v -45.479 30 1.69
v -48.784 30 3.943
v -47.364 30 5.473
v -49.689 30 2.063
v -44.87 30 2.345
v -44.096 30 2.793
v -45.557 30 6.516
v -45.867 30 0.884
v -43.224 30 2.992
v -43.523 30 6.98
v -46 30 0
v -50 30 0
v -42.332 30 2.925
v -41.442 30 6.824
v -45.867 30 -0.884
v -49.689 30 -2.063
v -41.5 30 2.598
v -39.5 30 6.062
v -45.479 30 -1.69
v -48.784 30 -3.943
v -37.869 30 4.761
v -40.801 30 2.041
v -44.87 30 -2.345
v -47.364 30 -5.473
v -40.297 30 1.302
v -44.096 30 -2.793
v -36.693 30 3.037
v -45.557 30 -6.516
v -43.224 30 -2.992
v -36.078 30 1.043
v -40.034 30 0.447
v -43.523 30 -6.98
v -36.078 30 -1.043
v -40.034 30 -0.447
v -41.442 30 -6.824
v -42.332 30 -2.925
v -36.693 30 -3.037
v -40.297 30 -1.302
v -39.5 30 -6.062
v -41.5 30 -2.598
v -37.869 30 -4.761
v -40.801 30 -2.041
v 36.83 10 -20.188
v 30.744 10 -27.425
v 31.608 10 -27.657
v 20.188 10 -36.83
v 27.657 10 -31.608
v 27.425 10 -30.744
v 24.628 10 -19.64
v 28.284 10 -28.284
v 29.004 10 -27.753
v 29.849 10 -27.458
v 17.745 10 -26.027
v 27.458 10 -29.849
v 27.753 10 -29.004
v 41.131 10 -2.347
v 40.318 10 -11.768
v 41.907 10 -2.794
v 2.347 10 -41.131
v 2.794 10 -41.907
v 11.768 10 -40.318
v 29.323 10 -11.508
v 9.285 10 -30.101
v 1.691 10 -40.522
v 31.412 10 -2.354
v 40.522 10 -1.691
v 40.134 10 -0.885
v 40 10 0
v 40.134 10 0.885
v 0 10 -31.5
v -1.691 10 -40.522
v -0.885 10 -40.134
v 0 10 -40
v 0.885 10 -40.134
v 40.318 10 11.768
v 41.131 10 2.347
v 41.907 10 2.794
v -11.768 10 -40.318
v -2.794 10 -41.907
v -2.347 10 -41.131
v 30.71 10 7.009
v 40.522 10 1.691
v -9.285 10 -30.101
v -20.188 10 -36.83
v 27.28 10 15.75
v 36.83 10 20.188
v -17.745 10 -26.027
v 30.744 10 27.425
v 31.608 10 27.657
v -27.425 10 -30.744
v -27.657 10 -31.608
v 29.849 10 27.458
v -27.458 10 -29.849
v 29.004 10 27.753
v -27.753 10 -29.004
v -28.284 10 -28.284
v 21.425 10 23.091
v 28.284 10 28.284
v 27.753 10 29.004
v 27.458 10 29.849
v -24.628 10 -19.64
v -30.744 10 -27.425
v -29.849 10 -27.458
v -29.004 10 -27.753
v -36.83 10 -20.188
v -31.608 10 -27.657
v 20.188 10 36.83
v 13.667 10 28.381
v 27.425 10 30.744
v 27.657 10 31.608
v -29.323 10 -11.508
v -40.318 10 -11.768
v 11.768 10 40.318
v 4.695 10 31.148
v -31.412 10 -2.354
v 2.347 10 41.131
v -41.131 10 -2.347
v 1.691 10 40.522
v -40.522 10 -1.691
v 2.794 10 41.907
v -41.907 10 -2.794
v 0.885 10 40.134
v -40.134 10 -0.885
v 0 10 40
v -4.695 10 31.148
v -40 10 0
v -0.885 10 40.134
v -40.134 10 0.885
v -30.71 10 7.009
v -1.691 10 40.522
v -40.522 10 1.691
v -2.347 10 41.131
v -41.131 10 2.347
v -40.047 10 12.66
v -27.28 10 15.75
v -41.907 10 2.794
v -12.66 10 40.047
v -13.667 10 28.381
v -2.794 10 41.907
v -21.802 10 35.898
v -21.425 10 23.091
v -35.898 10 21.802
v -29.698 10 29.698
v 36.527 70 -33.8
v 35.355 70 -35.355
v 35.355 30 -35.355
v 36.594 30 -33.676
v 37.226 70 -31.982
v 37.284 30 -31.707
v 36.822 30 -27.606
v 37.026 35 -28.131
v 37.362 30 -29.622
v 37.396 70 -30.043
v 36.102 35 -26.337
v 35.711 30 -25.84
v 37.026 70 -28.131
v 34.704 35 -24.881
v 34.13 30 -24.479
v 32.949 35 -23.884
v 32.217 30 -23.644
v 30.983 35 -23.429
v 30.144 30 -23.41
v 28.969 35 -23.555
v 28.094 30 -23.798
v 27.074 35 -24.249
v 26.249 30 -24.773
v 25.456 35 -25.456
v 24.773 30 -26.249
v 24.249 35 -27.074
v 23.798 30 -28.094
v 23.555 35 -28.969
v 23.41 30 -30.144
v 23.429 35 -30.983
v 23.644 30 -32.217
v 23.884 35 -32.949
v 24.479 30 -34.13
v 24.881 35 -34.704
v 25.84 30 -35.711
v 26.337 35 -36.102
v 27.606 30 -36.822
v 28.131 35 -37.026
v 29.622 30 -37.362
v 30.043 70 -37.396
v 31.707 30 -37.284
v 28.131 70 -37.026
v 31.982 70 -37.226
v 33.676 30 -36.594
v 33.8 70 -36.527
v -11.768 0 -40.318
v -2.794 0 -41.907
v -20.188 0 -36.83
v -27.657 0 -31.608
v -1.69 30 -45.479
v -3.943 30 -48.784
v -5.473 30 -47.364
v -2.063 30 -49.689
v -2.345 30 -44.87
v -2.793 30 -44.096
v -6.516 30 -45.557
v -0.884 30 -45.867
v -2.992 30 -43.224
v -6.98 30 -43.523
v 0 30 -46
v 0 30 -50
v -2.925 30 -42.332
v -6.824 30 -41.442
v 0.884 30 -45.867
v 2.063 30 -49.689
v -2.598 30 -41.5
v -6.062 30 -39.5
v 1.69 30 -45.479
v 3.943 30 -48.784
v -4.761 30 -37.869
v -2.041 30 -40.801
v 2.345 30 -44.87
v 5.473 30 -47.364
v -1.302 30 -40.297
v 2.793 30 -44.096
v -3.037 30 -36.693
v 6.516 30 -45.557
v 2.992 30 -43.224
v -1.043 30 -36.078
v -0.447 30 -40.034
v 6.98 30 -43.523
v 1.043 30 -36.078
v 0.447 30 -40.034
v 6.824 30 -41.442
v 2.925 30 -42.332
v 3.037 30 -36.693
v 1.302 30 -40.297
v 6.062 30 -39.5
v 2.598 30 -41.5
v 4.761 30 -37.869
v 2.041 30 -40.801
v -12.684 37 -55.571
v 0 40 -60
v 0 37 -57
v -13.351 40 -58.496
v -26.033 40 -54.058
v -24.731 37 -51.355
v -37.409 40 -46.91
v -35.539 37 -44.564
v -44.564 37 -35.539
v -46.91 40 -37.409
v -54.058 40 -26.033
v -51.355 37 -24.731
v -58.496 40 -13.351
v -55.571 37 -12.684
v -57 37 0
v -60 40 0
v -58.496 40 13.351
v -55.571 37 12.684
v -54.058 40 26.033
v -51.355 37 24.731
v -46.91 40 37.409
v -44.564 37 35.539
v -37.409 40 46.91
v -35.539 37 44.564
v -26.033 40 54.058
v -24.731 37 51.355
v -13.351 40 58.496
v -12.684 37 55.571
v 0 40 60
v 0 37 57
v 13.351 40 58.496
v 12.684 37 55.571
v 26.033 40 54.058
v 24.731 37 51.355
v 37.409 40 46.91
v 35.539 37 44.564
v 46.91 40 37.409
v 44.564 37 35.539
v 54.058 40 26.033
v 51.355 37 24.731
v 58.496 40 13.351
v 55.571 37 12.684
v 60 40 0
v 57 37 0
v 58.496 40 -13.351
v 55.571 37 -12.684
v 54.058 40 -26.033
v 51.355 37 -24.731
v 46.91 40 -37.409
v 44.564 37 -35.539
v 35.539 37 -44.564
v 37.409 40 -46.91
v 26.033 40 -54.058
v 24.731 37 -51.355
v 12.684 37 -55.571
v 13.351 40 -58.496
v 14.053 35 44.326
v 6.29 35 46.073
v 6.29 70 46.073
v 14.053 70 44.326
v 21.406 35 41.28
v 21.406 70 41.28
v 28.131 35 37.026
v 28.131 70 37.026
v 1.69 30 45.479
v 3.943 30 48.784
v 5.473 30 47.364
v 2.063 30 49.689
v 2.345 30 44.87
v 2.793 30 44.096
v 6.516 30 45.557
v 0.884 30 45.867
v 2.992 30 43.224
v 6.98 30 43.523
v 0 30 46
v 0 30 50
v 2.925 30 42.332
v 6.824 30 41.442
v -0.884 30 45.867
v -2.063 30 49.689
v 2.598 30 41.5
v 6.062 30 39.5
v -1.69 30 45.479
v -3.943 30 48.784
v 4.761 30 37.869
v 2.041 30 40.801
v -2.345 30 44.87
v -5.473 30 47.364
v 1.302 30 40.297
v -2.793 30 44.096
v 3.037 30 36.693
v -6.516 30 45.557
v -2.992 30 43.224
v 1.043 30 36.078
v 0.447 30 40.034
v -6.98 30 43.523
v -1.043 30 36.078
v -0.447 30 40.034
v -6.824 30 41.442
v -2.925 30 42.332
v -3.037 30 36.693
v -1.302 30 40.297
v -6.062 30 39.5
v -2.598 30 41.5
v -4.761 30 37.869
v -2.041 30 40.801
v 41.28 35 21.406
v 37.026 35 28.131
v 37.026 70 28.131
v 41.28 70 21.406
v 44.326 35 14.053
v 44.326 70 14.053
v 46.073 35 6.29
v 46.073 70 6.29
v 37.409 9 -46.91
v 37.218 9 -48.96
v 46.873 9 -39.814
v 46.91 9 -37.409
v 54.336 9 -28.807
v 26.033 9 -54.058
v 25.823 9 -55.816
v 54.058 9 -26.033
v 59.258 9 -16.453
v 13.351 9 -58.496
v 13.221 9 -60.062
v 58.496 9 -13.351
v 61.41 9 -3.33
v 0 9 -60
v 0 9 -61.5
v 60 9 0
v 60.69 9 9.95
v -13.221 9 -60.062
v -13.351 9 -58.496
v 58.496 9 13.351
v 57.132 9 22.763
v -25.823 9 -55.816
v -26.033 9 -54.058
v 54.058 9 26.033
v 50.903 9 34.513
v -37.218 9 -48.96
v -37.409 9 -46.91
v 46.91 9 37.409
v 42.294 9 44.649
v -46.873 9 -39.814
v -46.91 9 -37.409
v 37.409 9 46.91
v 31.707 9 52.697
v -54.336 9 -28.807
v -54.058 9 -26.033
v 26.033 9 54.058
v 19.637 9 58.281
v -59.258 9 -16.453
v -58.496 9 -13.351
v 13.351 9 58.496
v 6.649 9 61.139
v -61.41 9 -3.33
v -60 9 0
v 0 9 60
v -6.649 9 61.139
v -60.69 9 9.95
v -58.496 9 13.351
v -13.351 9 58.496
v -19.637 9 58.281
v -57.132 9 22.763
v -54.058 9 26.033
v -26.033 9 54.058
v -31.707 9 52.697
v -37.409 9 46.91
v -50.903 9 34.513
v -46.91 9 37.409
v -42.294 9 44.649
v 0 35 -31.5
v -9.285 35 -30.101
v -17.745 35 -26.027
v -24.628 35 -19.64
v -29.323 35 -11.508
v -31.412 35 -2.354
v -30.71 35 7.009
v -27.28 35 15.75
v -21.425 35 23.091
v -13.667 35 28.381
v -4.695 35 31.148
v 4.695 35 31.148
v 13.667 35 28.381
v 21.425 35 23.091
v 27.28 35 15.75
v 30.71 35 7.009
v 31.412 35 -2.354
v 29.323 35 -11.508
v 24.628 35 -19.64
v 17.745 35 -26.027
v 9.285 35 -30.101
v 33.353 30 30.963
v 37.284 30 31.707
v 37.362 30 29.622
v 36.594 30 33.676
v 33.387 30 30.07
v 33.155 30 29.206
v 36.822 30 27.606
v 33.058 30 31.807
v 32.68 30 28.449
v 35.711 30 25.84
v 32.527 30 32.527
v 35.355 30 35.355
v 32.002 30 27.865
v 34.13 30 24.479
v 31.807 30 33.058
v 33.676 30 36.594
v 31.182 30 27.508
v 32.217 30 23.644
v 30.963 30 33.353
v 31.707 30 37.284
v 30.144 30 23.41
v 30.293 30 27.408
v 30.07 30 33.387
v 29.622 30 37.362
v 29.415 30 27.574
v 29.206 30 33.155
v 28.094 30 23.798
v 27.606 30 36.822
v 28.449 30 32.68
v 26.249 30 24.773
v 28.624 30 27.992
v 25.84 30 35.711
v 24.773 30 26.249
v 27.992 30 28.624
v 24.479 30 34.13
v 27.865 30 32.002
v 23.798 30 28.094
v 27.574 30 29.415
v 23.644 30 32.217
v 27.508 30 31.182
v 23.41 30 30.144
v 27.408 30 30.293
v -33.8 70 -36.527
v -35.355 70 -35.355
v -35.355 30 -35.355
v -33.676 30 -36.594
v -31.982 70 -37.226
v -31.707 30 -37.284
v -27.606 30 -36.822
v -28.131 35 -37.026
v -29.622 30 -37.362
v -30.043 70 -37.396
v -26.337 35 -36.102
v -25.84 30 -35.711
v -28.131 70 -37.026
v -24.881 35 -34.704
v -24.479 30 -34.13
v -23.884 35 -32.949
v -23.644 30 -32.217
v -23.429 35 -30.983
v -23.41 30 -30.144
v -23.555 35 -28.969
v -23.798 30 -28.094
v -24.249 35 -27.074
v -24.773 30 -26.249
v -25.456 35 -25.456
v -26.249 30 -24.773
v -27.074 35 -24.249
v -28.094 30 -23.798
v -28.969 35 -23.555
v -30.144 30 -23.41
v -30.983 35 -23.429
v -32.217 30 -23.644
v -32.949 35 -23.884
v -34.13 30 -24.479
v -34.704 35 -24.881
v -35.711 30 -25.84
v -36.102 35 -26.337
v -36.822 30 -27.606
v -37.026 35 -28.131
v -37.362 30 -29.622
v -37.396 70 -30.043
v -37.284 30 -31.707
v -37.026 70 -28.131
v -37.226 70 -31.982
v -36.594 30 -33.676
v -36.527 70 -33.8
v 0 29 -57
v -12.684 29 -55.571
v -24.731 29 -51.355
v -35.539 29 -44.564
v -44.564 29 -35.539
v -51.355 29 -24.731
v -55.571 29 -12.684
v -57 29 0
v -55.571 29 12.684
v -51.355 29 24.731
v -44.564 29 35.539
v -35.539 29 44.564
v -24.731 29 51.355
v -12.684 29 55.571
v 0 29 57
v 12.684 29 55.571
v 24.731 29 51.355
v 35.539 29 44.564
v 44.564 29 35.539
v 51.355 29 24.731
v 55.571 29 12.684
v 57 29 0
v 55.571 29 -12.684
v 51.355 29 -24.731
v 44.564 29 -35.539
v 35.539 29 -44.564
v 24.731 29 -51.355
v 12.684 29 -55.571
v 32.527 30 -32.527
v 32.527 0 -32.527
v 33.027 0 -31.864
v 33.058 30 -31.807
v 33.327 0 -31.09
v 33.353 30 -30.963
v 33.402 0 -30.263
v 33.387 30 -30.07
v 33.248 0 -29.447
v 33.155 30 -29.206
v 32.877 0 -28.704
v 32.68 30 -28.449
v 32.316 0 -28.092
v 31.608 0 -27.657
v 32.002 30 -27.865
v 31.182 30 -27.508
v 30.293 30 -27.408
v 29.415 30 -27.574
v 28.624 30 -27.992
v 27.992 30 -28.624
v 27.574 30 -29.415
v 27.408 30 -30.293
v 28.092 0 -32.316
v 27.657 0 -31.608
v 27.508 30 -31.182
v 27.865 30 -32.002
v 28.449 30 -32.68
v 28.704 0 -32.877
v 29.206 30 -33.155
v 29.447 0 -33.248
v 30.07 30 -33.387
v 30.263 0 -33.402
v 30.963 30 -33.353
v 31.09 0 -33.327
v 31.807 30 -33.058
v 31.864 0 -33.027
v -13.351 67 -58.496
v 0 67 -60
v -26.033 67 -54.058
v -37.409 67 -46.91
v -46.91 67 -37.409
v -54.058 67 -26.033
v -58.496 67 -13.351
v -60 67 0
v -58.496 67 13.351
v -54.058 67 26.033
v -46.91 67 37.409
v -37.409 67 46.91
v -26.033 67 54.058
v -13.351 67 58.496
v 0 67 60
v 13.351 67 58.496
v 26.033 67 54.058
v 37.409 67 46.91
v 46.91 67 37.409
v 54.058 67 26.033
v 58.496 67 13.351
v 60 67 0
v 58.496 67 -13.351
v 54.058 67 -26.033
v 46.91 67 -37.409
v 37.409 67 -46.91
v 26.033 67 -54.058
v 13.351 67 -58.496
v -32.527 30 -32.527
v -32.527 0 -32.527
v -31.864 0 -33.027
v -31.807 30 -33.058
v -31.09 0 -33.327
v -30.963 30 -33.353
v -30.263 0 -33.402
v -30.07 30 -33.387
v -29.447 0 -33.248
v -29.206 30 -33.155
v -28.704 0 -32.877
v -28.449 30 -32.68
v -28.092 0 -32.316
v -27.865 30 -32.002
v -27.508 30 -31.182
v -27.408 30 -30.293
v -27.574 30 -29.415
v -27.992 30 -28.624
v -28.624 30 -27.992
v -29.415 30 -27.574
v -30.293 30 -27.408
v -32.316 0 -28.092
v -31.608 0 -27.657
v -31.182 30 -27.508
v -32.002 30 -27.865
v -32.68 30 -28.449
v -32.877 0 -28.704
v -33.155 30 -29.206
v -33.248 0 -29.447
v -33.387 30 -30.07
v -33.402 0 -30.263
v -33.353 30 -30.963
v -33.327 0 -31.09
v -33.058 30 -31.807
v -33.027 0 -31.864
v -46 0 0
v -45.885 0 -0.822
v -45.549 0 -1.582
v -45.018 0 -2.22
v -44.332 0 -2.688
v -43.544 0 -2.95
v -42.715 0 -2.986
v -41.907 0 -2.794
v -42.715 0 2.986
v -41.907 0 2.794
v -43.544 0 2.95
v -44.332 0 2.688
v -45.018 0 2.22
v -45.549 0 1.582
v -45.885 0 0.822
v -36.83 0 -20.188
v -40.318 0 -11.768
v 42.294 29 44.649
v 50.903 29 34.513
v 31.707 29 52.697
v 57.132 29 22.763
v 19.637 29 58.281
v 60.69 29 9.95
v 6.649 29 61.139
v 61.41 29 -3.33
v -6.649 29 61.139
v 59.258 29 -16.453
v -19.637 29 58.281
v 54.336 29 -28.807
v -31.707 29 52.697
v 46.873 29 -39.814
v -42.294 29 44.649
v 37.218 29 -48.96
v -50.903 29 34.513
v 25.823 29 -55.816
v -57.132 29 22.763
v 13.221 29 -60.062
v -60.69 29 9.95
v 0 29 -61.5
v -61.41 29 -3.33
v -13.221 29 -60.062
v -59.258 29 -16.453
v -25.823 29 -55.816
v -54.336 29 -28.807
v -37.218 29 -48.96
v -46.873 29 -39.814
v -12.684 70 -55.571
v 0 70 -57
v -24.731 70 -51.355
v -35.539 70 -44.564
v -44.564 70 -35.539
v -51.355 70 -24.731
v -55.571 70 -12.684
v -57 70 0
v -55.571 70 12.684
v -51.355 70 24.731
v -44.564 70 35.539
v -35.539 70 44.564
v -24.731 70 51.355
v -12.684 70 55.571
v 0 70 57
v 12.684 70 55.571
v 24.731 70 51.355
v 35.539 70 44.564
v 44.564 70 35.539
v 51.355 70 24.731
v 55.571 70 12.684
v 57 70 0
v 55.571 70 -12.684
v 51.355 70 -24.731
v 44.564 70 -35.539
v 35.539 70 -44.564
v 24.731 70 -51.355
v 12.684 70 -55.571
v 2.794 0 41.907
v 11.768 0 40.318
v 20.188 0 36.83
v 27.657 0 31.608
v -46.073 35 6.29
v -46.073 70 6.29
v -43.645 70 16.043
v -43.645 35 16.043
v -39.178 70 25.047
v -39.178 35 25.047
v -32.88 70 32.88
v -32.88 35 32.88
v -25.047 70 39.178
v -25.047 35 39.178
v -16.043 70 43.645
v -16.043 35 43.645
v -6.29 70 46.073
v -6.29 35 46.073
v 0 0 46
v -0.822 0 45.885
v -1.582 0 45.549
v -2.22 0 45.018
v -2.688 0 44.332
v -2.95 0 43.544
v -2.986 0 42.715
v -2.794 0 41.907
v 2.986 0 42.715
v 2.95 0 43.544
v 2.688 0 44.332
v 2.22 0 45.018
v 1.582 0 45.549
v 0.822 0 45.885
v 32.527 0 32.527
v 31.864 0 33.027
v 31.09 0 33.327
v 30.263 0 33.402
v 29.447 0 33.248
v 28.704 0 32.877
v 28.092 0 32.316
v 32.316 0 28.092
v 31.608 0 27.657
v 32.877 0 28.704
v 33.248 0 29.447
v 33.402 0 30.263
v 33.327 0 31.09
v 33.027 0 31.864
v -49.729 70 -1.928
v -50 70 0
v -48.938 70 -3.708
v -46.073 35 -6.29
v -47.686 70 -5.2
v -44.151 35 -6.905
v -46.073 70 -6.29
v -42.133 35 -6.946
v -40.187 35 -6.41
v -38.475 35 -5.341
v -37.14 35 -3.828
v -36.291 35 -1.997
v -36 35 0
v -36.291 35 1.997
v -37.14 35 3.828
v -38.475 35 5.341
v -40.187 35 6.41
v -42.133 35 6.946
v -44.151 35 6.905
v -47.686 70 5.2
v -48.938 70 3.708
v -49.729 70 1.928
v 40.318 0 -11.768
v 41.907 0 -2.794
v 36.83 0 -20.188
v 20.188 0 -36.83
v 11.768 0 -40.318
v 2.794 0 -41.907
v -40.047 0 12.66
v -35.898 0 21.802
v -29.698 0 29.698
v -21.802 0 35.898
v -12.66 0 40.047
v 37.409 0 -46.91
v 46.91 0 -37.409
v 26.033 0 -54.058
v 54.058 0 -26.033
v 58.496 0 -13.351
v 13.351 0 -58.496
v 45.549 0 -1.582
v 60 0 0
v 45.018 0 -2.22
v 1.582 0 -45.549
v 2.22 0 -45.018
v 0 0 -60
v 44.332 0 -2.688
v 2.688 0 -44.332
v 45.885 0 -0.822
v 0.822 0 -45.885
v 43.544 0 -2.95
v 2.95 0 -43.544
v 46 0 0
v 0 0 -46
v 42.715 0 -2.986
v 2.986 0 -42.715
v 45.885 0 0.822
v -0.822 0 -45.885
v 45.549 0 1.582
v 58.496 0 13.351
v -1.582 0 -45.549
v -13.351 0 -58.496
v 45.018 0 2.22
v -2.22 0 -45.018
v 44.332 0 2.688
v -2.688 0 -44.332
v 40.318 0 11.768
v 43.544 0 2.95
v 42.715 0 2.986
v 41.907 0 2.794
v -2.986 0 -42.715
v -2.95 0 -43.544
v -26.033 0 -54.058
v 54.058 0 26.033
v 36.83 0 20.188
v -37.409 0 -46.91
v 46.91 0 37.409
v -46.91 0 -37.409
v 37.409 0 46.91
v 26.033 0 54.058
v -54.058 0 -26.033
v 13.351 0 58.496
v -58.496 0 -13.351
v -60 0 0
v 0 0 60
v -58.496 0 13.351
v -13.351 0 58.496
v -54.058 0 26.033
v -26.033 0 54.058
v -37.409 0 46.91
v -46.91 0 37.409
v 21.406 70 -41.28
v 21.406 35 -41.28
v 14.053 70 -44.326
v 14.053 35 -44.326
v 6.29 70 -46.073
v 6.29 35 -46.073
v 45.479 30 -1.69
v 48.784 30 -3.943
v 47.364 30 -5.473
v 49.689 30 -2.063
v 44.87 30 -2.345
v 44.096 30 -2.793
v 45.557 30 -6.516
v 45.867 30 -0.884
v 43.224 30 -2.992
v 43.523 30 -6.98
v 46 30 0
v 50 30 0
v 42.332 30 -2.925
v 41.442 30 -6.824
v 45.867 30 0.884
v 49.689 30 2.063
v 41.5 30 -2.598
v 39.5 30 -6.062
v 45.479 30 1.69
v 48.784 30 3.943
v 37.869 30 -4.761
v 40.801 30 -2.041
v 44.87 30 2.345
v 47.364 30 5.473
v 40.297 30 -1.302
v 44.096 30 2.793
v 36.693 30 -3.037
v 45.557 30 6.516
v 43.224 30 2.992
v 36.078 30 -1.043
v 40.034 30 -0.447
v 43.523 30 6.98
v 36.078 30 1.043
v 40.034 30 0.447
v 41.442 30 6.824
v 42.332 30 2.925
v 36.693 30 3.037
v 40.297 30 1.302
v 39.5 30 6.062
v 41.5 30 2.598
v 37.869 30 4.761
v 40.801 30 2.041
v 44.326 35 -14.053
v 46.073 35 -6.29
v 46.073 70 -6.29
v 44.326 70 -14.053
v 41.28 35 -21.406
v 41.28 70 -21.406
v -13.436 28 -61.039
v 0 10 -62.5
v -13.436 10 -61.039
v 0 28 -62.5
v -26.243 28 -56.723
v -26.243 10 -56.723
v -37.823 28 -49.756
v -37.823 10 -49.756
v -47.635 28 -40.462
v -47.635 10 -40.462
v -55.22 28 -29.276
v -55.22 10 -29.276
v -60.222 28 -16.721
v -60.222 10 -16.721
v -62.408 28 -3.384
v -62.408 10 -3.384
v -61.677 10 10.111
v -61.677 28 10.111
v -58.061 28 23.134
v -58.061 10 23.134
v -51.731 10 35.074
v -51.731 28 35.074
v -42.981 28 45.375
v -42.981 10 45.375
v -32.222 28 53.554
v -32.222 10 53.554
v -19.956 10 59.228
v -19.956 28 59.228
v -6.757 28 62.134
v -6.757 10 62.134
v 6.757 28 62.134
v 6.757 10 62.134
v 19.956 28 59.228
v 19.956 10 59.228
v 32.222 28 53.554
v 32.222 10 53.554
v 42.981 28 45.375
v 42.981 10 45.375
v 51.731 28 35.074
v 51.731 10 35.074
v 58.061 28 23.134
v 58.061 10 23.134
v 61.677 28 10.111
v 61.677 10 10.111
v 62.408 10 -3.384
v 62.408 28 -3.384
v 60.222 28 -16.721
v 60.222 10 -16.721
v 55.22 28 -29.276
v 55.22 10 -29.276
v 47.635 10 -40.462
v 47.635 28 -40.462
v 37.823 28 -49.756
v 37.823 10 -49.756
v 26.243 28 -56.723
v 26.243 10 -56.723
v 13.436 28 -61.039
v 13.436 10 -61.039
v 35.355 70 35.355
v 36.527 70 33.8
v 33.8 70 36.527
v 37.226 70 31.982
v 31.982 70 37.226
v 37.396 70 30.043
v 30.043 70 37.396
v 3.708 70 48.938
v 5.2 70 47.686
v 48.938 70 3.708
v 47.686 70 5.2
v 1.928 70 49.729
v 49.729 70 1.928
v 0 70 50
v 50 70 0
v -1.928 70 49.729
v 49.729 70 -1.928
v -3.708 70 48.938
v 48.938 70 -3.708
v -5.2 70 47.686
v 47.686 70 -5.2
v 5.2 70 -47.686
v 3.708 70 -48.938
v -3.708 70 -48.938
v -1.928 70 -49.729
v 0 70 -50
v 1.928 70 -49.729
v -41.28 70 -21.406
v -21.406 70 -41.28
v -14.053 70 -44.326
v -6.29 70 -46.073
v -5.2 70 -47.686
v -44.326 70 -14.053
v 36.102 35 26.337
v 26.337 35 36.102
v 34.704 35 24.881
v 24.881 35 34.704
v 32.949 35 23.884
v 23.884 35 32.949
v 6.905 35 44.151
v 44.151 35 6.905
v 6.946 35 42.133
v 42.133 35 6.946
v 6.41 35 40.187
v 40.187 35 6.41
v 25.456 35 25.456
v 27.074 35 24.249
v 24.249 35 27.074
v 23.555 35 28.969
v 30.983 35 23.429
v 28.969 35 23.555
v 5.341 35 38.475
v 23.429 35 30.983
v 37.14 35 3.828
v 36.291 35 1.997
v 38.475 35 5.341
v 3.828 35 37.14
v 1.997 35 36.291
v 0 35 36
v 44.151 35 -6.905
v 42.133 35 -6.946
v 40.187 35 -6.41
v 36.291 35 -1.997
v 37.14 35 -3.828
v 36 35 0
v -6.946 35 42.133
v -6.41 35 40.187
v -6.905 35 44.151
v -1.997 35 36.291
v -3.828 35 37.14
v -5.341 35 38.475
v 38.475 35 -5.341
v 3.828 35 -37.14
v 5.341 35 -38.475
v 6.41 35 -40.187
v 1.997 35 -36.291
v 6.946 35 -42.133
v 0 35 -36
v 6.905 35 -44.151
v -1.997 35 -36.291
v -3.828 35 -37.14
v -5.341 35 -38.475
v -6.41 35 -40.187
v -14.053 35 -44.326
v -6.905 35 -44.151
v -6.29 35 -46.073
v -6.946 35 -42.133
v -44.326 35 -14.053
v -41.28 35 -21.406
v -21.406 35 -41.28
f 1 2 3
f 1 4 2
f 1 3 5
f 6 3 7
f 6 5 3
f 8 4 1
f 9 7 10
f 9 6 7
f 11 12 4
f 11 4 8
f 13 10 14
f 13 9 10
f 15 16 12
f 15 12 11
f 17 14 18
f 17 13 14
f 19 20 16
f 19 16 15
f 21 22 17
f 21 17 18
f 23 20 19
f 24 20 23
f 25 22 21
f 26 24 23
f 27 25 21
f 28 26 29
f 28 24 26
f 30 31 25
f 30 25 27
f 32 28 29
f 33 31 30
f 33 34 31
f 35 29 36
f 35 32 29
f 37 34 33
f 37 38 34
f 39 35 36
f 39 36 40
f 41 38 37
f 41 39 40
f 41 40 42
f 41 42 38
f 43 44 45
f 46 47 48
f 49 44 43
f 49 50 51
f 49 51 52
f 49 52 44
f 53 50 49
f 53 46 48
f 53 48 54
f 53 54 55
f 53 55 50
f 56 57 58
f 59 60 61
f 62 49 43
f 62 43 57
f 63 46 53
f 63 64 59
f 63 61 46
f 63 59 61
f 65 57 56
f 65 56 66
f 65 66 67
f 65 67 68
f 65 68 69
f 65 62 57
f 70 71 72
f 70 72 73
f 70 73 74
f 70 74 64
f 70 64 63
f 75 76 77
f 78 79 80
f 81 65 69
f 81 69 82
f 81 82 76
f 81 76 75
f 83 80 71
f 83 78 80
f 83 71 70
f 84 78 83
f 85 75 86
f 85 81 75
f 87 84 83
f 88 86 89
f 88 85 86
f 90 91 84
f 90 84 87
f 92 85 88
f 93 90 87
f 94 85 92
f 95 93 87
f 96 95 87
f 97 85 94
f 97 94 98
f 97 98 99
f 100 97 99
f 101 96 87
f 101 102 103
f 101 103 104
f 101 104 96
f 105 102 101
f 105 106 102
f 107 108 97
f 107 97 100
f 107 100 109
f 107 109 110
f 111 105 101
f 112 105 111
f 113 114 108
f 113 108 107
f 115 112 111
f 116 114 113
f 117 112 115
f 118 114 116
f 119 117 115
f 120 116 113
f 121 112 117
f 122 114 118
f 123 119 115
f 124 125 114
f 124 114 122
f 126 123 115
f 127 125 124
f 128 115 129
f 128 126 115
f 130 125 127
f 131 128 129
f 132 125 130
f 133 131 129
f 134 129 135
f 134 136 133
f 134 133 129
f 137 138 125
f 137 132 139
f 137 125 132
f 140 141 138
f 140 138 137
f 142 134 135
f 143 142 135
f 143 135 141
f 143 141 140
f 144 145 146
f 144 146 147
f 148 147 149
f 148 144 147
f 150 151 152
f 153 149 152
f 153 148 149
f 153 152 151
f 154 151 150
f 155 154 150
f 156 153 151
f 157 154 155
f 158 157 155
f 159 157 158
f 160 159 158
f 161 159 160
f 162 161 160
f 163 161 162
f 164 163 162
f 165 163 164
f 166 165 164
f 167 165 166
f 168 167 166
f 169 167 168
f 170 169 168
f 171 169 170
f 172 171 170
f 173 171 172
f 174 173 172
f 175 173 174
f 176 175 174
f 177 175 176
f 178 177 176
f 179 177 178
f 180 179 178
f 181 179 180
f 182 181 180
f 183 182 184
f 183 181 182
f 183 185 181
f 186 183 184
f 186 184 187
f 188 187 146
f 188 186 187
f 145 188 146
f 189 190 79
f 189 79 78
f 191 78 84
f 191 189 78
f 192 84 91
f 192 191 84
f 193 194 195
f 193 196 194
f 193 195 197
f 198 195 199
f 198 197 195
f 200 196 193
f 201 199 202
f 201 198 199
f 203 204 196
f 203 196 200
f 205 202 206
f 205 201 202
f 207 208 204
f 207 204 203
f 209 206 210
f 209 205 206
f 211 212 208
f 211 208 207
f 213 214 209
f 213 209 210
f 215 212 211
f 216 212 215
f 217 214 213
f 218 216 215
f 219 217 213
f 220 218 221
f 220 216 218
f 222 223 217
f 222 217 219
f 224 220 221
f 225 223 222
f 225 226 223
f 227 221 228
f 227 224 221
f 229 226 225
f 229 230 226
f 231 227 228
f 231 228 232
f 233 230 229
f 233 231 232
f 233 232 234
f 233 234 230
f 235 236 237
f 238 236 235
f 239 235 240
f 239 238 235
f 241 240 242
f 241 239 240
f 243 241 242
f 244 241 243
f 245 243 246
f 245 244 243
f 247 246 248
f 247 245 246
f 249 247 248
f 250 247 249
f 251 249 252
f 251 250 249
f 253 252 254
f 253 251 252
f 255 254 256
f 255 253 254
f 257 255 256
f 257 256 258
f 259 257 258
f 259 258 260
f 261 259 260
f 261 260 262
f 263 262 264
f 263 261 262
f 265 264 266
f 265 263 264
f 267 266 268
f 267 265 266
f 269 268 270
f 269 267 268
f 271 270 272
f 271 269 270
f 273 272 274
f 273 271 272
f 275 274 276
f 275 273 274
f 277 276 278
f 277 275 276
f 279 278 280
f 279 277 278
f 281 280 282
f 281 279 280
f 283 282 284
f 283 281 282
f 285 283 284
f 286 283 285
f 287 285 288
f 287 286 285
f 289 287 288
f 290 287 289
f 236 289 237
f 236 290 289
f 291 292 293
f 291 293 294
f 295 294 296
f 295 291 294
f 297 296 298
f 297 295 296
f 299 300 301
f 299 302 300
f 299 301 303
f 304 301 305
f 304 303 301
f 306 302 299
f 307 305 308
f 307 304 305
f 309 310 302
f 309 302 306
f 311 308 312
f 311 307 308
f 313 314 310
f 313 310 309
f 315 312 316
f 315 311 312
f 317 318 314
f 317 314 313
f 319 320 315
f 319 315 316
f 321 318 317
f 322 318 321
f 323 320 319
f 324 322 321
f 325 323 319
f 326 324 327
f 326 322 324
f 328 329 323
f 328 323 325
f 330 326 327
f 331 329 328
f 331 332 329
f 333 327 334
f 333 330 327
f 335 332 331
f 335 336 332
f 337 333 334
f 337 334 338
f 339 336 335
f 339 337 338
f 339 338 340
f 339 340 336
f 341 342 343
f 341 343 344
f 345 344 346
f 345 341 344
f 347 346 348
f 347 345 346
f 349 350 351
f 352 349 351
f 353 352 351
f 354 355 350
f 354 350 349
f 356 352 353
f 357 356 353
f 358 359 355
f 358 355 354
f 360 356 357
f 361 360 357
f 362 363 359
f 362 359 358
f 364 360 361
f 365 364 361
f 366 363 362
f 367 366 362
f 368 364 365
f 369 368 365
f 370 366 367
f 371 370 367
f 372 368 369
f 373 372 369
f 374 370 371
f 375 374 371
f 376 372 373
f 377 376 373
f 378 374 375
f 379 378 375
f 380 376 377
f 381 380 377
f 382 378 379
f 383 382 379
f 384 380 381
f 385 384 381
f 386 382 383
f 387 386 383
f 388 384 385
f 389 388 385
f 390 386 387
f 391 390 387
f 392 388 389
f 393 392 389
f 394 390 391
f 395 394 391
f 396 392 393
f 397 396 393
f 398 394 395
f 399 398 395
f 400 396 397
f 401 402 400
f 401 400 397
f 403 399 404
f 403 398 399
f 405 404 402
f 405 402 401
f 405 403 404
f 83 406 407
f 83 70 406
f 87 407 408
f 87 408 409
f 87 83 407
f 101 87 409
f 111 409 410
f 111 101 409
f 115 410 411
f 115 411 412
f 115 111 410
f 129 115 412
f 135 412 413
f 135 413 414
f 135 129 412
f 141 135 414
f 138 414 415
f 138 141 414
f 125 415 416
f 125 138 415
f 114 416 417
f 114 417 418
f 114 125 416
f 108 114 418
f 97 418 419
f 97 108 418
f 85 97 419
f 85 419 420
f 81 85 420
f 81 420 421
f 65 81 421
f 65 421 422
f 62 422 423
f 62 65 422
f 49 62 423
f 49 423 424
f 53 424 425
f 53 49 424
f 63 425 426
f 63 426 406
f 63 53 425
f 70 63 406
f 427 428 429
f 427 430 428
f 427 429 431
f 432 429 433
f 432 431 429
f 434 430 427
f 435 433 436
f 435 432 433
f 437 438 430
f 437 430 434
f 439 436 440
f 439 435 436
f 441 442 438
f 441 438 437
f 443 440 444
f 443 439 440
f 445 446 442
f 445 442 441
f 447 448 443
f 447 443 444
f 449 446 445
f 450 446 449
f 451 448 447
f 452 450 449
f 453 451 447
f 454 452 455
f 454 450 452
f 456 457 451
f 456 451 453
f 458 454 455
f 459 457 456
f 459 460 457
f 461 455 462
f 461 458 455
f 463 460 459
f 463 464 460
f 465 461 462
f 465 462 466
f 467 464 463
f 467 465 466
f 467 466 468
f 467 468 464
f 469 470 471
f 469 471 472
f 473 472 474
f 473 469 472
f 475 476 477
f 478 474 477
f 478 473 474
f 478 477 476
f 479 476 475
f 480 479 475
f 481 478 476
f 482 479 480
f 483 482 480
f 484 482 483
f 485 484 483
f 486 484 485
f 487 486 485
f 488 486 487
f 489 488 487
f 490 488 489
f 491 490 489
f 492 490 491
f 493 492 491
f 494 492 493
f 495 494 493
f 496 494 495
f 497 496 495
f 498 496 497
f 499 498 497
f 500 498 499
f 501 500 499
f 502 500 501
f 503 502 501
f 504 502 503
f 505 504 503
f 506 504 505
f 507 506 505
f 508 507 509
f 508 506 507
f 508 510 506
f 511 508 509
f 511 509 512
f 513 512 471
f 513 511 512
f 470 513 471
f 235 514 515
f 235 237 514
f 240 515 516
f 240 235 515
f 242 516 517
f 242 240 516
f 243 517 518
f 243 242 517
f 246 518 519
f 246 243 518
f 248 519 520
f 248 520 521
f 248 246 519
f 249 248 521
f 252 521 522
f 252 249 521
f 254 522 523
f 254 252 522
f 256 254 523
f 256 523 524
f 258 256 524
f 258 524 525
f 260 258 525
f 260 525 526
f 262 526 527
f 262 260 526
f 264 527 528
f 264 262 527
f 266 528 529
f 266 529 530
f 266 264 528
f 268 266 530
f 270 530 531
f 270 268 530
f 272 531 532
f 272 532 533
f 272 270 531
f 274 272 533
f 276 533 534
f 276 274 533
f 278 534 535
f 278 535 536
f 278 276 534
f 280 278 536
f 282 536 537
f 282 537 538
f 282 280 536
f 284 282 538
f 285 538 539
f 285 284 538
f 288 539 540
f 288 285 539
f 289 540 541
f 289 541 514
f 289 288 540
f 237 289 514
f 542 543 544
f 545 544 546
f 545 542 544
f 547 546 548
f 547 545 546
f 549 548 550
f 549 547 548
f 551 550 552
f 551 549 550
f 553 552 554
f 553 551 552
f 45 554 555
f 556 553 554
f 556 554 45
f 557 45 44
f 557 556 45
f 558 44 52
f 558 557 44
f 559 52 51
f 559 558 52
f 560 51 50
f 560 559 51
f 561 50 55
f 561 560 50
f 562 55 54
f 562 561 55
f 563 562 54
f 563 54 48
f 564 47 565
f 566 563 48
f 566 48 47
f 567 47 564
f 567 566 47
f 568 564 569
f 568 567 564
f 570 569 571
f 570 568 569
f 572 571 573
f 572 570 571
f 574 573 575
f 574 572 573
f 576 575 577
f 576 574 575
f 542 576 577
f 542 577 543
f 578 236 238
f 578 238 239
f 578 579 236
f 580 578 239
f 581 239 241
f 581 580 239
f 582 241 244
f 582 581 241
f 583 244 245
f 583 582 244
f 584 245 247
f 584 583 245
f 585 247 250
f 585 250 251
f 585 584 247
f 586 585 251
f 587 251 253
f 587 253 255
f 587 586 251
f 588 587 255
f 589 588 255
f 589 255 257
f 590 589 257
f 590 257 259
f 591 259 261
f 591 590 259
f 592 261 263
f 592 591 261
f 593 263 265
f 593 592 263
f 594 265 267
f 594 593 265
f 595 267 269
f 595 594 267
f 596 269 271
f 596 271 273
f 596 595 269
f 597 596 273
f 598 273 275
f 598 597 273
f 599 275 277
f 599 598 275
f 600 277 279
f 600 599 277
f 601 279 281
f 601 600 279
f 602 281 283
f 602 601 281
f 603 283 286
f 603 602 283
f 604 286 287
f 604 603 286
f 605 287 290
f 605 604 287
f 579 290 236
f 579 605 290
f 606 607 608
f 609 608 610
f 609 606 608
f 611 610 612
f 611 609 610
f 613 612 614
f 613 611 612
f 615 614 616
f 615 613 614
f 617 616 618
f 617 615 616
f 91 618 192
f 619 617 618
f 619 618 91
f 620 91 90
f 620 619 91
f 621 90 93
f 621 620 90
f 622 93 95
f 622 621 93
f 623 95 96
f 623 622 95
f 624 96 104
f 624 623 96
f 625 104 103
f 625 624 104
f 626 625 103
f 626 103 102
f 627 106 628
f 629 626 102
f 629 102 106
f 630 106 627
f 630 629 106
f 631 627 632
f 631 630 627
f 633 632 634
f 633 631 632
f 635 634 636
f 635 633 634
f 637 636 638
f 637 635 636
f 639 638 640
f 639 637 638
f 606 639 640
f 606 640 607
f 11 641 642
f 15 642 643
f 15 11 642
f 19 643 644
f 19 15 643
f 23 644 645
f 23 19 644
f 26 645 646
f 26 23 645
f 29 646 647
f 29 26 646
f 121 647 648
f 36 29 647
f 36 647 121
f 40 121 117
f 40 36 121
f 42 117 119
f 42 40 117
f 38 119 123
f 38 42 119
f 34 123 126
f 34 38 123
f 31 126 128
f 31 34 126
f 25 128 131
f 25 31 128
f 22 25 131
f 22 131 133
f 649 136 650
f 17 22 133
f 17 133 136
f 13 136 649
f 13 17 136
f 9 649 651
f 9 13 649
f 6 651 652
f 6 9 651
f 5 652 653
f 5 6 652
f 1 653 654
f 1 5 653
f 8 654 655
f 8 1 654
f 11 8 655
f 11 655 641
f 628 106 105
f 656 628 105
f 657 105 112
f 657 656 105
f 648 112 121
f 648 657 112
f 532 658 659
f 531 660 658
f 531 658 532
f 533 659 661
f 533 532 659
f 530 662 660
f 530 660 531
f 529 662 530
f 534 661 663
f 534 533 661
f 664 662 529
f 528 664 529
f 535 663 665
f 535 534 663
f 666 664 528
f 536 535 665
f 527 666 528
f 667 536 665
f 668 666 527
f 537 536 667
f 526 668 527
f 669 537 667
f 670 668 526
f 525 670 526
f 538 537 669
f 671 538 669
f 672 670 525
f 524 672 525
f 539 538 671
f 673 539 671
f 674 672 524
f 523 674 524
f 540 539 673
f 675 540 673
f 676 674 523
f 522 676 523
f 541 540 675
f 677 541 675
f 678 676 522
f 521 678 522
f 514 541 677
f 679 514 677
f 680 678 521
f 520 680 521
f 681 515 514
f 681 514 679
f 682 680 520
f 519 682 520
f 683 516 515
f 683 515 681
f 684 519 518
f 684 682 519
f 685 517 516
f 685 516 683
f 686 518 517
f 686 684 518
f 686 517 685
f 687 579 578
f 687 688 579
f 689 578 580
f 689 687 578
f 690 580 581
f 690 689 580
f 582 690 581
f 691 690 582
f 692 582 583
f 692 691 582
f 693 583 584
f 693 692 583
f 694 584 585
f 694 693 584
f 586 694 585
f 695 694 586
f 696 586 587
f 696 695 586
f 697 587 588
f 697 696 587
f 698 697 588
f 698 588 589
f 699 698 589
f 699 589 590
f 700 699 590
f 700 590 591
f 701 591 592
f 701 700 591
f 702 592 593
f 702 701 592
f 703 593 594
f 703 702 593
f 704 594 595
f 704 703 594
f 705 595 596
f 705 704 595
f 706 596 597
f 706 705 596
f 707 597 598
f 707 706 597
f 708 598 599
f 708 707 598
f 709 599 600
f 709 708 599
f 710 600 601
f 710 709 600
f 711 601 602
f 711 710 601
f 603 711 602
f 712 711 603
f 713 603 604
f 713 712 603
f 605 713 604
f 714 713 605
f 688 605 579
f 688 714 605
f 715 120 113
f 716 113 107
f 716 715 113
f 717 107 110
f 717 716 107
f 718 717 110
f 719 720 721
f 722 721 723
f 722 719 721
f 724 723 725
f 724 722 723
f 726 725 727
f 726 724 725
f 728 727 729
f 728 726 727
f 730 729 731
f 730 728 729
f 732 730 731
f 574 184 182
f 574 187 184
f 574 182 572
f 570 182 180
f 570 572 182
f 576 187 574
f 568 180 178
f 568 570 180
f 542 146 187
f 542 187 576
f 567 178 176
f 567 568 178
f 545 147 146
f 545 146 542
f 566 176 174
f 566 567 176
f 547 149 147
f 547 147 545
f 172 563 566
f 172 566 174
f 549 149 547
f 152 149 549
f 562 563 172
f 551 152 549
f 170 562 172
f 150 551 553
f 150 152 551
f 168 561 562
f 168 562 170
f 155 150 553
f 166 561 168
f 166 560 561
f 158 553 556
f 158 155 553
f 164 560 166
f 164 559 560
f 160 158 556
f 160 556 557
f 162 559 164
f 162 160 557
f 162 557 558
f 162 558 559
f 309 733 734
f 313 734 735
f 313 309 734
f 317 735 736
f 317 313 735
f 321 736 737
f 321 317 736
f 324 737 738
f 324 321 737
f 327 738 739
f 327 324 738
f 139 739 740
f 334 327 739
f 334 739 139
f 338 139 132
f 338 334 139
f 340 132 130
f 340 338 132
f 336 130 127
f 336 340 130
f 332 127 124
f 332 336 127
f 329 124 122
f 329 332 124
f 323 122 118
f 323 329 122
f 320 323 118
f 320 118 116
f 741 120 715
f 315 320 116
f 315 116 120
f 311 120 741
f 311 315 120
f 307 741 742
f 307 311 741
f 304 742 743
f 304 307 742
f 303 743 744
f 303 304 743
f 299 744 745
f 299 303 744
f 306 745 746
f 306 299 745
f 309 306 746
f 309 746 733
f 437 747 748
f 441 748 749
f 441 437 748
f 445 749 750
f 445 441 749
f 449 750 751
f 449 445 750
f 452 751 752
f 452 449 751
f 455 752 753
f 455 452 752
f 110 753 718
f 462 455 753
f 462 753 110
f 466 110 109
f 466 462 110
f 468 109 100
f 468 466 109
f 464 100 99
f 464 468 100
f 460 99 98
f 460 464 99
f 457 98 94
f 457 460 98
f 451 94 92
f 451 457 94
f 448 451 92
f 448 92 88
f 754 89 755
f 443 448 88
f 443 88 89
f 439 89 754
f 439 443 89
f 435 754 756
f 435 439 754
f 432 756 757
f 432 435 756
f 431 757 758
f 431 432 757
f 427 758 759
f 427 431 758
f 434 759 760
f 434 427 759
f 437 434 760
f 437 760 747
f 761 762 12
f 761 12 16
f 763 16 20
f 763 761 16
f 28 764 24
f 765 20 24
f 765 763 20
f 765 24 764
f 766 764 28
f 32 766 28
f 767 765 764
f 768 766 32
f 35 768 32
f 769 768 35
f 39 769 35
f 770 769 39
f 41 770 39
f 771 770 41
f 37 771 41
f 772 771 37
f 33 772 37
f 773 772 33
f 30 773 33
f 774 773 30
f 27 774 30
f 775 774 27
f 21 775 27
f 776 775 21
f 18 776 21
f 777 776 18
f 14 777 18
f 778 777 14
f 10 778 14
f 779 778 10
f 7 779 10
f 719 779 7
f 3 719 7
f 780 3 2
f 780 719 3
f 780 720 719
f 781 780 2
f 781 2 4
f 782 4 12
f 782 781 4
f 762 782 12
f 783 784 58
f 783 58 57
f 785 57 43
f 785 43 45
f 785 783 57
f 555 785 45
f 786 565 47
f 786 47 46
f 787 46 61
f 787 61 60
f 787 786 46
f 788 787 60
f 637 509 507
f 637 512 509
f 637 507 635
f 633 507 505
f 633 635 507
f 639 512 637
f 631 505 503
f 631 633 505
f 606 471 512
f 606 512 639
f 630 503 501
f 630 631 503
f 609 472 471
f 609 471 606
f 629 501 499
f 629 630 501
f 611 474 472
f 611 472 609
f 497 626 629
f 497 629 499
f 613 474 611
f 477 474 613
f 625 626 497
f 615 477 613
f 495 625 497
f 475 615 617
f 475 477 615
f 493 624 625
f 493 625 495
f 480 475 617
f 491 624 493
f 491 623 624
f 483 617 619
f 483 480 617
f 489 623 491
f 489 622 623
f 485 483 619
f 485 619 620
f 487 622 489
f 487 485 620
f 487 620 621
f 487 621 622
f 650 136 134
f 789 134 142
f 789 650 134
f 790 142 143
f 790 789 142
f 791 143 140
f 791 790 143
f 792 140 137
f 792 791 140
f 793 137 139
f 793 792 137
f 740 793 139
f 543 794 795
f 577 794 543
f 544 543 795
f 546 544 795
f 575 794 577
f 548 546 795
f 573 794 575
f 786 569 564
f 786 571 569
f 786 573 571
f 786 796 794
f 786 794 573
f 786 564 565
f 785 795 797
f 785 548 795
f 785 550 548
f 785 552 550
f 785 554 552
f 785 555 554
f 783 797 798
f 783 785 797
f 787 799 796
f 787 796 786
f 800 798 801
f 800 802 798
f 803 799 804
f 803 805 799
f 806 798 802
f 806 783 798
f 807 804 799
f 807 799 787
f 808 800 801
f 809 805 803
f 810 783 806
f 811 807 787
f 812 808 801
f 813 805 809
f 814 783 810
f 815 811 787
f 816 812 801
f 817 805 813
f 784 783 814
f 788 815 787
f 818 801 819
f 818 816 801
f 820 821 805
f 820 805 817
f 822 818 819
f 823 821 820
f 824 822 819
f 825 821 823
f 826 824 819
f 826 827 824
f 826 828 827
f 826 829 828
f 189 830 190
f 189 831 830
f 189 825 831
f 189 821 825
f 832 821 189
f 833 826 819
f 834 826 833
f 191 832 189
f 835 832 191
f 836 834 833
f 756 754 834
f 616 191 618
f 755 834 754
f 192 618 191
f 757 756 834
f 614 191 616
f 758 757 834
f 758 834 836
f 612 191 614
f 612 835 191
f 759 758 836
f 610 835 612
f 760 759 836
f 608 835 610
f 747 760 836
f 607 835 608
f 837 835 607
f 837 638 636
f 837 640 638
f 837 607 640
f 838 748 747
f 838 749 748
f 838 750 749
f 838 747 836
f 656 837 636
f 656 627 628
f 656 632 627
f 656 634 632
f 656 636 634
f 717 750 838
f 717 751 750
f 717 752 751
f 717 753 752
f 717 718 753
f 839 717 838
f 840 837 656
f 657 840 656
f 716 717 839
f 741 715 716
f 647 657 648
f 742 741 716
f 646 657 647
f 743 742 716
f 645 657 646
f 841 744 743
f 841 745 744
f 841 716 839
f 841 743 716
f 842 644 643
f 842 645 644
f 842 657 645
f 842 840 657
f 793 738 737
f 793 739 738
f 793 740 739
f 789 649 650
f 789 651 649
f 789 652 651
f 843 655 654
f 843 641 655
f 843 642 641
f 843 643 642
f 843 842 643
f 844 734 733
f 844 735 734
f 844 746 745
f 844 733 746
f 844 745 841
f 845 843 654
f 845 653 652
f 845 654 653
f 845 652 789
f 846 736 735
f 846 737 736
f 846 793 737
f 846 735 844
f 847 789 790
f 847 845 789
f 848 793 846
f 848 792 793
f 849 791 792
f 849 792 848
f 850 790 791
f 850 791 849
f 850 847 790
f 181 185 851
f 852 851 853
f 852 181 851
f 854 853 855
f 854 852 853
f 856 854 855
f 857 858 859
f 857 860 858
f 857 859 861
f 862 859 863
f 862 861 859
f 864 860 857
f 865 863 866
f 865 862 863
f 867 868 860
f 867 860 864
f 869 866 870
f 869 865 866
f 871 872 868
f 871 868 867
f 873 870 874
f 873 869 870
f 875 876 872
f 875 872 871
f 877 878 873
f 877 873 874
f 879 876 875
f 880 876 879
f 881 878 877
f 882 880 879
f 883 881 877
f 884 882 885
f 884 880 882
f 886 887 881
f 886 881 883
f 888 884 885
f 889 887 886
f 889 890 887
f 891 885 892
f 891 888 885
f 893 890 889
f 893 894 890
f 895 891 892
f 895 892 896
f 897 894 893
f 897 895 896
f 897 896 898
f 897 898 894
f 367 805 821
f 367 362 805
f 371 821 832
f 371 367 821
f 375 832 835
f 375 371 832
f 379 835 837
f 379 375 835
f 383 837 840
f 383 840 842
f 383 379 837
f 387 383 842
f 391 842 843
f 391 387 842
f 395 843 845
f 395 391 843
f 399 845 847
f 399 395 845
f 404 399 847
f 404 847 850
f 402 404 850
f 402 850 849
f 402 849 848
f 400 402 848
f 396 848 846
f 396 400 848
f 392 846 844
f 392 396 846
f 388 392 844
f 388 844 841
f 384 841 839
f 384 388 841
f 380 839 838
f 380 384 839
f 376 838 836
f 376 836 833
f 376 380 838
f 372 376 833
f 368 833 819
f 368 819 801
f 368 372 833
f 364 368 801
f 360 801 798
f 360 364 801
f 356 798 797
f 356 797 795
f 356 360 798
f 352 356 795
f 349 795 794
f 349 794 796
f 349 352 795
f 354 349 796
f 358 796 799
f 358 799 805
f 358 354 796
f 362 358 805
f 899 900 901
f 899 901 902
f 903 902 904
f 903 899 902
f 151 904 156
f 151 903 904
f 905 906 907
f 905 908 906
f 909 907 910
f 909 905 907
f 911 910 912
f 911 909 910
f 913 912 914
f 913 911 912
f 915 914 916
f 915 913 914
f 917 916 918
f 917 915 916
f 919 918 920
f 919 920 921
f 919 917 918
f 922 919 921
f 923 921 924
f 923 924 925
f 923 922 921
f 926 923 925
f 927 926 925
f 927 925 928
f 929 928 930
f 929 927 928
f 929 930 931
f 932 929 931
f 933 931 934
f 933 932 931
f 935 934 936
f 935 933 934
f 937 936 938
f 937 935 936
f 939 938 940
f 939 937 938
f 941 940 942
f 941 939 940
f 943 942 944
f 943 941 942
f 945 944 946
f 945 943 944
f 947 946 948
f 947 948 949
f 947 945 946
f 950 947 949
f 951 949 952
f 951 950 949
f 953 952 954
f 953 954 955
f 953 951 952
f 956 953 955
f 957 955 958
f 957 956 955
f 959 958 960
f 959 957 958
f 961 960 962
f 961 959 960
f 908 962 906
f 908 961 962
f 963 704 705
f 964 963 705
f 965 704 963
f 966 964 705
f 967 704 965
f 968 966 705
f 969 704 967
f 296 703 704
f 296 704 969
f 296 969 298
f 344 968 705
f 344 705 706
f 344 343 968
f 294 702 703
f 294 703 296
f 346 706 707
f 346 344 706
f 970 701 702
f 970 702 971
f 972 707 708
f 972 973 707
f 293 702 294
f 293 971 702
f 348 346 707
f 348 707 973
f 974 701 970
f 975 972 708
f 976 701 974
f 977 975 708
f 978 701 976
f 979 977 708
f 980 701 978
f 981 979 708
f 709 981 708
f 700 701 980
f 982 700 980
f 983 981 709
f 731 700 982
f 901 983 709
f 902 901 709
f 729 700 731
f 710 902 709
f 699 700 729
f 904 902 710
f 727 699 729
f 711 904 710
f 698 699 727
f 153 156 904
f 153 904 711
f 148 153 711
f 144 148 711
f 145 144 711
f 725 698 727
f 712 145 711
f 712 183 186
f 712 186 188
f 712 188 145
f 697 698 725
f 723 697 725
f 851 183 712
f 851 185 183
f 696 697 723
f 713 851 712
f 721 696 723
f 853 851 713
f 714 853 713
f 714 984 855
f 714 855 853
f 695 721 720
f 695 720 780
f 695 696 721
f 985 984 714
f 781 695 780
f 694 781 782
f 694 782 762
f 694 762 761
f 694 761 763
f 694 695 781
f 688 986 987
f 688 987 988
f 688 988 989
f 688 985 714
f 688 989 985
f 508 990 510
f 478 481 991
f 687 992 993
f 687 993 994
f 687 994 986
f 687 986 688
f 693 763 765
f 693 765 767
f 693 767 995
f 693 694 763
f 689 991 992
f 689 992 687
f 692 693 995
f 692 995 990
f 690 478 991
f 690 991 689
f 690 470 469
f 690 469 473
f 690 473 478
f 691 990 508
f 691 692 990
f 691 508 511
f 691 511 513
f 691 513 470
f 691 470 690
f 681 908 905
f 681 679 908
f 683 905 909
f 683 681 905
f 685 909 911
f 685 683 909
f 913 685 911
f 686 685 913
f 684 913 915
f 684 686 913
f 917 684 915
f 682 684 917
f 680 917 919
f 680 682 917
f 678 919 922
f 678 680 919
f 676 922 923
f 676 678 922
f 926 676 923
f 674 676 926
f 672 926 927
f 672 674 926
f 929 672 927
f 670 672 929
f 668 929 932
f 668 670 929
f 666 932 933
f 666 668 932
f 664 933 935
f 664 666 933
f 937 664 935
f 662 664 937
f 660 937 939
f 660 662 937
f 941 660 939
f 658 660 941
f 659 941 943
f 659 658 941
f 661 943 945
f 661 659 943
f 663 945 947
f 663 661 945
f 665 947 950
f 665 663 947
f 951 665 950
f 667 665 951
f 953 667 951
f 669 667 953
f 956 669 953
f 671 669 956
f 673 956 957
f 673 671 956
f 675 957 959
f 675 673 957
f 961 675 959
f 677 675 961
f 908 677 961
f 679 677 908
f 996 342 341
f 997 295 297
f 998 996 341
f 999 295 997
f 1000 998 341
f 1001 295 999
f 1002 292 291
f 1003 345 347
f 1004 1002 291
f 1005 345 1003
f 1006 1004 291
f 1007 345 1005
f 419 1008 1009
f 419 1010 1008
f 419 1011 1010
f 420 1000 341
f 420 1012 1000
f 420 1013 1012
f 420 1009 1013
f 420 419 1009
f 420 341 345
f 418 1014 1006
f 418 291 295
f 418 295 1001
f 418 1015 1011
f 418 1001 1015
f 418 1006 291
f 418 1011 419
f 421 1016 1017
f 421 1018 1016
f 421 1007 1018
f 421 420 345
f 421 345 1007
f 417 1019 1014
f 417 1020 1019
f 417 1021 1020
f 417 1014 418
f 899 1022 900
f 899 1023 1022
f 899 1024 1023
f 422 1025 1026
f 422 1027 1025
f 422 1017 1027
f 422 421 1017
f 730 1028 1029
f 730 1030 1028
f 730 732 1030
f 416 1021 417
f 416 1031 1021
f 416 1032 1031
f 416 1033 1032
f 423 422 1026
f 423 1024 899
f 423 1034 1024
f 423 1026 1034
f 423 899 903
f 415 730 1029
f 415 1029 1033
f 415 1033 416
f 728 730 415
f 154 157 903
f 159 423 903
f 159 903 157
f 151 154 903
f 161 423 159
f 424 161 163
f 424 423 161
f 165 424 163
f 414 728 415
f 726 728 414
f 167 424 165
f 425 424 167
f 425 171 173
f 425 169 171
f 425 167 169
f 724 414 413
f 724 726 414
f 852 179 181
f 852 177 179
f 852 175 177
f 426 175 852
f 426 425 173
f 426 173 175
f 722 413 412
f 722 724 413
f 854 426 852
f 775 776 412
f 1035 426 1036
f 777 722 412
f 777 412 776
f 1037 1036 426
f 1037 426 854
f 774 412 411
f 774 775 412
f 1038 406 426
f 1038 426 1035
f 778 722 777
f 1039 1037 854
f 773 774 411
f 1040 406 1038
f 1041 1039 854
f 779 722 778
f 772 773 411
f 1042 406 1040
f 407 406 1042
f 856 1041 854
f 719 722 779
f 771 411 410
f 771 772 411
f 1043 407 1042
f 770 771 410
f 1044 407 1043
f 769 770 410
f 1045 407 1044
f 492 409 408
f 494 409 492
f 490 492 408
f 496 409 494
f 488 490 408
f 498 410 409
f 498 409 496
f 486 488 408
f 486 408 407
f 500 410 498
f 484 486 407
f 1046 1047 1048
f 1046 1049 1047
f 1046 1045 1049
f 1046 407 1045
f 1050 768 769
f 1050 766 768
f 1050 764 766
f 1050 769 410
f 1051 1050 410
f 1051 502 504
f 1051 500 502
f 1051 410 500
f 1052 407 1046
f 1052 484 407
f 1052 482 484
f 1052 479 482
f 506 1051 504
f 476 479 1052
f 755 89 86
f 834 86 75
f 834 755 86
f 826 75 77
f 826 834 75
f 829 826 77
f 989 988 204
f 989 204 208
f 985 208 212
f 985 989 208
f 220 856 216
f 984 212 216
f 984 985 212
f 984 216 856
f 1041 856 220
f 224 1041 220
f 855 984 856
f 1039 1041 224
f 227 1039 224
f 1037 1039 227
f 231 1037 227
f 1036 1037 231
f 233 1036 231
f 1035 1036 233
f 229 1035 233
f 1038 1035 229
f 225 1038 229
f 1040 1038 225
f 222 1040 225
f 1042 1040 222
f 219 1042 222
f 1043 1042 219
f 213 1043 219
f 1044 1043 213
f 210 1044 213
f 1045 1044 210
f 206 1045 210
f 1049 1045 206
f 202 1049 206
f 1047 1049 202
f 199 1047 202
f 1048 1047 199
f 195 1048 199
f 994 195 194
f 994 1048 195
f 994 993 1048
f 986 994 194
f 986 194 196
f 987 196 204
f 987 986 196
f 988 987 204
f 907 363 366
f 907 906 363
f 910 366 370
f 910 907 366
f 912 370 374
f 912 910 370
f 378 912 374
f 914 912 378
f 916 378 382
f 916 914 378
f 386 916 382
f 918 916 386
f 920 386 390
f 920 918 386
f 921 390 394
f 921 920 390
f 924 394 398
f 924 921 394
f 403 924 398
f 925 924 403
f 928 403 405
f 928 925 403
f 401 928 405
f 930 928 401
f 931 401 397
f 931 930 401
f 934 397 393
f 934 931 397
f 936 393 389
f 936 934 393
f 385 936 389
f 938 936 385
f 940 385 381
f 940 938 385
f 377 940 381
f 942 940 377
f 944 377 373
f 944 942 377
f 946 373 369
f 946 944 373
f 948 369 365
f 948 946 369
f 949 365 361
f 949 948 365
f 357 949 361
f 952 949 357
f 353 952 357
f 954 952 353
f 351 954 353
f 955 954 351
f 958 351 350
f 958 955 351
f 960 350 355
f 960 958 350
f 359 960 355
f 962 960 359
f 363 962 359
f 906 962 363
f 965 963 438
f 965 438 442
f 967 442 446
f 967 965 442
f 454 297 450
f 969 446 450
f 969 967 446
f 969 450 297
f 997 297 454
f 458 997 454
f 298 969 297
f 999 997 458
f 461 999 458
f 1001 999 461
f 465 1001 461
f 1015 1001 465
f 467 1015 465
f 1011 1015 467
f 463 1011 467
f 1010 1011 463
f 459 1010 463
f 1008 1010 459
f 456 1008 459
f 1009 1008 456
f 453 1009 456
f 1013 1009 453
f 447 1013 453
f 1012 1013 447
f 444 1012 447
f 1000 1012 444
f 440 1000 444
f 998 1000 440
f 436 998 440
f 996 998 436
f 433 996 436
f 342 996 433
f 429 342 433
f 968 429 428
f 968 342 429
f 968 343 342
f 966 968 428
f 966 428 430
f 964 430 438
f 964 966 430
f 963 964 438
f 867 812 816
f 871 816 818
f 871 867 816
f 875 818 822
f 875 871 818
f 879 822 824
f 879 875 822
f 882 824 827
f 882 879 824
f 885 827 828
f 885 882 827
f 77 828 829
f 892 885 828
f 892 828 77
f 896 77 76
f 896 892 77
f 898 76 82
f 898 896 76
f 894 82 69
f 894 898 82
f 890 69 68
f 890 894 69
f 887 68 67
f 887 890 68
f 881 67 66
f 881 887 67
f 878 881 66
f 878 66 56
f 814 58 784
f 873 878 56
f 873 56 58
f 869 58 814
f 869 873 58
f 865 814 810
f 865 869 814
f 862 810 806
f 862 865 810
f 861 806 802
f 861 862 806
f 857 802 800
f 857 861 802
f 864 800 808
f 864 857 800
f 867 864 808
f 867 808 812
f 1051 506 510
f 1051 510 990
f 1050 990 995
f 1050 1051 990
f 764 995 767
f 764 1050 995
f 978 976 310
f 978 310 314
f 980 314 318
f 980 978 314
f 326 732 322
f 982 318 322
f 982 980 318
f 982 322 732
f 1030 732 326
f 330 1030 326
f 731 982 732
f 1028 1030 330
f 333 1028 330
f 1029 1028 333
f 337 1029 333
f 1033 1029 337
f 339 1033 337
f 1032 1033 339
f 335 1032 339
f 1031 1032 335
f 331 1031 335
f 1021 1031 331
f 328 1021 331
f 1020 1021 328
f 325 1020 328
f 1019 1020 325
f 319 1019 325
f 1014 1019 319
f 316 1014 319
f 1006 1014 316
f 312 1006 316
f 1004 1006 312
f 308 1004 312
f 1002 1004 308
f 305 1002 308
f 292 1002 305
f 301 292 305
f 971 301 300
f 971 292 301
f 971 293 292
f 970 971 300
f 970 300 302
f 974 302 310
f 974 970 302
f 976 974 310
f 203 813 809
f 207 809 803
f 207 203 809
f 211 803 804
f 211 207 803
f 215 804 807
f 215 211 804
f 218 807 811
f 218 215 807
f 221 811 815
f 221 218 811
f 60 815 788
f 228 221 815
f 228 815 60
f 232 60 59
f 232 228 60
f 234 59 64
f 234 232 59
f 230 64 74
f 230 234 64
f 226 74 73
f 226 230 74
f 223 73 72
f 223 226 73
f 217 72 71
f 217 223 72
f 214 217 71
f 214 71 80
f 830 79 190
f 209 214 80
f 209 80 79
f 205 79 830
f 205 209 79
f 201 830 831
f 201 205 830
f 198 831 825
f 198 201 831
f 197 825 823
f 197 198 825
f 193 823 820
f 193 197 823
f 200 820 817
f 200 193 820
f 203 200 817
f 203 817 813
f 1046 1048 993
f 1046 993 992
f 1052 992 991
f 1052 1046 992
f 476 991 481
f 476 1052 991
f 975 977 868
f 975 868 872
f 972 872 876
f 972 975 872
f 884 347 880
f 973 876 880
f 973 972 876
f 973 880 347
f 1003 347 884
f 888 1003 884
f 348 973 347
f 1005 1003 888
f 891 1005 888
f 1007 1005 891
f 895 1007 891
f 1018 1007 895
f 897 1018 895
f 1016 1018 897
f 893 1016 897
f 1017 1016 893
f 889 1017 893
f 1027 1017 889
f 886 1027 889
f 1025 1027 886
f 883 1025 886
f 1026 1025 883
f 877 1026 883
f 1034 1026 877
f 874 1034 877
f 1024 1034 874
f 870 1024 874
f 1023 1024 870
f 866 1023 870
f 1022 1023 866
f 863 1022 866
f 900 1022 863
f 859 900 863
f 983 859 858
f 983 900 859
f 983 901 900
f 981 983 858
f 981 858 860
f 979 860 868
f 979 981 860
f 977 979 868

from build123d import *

# Parameters (mm, degrees)
PATTERN_CIRCULAR_1_COUNT = 8


with BuildPart() as part:
    # Эскиз1 → Повернуть1 (revolve)
    with BuildSketch(Plane.XY, mode=Mode.PRIVATE) as revolve_1_sk:
        Polygon((-42, 0), (-60, 0), (-60, 9), (-61.5, 9), (-62.5, 10), (-62.5, 28), (-61.5, 29), (-57, 29), (-57, 37), (-60, 40), (-60, 67), (-57, 70), (-46.5, 70), (-46.5, 35), (-31.5, 35), (-31.5, 10), (-42, 10), align=None)
    revolve(revolve_1_sk.sketch.rotate(Axis((0, 0, 0), (0, 1, 0)), 270), axis=Axis((0, 0, 0), (0, 1, 0)))

    # Эскиз5 → Вырез-Повернуть1 (revolve, cut)
    with BuildSketch(Plane.XY):
        Polygon((-43, 0), (-46, 0), (-46, 30), (-50, 30), (-50, 70), (-43, 70), align=None)
    cut_revolve_1 = revolve(axis=Axis((-43, 84.512066433, 0), (0, -1, 0)), mode=Mode.SUBTRACT)

    # Круговой массив1: Вырез-Повернуть1 ×8 about axis, 1 skipped
    pattern_circular_1_axis = Axis((0, 0, 0), (0, -1, 0))
    add([cut_revolve_1.rotate(pattern_circular_1_axis, i * 360 / PATTERN_CIRCULAR_1_COUNT) for i in range(1, PATTERN_CIRCULAR_1_COUNT) if i not in (7,)], mode=Mode.SUBTRACT)


solid = part.part
